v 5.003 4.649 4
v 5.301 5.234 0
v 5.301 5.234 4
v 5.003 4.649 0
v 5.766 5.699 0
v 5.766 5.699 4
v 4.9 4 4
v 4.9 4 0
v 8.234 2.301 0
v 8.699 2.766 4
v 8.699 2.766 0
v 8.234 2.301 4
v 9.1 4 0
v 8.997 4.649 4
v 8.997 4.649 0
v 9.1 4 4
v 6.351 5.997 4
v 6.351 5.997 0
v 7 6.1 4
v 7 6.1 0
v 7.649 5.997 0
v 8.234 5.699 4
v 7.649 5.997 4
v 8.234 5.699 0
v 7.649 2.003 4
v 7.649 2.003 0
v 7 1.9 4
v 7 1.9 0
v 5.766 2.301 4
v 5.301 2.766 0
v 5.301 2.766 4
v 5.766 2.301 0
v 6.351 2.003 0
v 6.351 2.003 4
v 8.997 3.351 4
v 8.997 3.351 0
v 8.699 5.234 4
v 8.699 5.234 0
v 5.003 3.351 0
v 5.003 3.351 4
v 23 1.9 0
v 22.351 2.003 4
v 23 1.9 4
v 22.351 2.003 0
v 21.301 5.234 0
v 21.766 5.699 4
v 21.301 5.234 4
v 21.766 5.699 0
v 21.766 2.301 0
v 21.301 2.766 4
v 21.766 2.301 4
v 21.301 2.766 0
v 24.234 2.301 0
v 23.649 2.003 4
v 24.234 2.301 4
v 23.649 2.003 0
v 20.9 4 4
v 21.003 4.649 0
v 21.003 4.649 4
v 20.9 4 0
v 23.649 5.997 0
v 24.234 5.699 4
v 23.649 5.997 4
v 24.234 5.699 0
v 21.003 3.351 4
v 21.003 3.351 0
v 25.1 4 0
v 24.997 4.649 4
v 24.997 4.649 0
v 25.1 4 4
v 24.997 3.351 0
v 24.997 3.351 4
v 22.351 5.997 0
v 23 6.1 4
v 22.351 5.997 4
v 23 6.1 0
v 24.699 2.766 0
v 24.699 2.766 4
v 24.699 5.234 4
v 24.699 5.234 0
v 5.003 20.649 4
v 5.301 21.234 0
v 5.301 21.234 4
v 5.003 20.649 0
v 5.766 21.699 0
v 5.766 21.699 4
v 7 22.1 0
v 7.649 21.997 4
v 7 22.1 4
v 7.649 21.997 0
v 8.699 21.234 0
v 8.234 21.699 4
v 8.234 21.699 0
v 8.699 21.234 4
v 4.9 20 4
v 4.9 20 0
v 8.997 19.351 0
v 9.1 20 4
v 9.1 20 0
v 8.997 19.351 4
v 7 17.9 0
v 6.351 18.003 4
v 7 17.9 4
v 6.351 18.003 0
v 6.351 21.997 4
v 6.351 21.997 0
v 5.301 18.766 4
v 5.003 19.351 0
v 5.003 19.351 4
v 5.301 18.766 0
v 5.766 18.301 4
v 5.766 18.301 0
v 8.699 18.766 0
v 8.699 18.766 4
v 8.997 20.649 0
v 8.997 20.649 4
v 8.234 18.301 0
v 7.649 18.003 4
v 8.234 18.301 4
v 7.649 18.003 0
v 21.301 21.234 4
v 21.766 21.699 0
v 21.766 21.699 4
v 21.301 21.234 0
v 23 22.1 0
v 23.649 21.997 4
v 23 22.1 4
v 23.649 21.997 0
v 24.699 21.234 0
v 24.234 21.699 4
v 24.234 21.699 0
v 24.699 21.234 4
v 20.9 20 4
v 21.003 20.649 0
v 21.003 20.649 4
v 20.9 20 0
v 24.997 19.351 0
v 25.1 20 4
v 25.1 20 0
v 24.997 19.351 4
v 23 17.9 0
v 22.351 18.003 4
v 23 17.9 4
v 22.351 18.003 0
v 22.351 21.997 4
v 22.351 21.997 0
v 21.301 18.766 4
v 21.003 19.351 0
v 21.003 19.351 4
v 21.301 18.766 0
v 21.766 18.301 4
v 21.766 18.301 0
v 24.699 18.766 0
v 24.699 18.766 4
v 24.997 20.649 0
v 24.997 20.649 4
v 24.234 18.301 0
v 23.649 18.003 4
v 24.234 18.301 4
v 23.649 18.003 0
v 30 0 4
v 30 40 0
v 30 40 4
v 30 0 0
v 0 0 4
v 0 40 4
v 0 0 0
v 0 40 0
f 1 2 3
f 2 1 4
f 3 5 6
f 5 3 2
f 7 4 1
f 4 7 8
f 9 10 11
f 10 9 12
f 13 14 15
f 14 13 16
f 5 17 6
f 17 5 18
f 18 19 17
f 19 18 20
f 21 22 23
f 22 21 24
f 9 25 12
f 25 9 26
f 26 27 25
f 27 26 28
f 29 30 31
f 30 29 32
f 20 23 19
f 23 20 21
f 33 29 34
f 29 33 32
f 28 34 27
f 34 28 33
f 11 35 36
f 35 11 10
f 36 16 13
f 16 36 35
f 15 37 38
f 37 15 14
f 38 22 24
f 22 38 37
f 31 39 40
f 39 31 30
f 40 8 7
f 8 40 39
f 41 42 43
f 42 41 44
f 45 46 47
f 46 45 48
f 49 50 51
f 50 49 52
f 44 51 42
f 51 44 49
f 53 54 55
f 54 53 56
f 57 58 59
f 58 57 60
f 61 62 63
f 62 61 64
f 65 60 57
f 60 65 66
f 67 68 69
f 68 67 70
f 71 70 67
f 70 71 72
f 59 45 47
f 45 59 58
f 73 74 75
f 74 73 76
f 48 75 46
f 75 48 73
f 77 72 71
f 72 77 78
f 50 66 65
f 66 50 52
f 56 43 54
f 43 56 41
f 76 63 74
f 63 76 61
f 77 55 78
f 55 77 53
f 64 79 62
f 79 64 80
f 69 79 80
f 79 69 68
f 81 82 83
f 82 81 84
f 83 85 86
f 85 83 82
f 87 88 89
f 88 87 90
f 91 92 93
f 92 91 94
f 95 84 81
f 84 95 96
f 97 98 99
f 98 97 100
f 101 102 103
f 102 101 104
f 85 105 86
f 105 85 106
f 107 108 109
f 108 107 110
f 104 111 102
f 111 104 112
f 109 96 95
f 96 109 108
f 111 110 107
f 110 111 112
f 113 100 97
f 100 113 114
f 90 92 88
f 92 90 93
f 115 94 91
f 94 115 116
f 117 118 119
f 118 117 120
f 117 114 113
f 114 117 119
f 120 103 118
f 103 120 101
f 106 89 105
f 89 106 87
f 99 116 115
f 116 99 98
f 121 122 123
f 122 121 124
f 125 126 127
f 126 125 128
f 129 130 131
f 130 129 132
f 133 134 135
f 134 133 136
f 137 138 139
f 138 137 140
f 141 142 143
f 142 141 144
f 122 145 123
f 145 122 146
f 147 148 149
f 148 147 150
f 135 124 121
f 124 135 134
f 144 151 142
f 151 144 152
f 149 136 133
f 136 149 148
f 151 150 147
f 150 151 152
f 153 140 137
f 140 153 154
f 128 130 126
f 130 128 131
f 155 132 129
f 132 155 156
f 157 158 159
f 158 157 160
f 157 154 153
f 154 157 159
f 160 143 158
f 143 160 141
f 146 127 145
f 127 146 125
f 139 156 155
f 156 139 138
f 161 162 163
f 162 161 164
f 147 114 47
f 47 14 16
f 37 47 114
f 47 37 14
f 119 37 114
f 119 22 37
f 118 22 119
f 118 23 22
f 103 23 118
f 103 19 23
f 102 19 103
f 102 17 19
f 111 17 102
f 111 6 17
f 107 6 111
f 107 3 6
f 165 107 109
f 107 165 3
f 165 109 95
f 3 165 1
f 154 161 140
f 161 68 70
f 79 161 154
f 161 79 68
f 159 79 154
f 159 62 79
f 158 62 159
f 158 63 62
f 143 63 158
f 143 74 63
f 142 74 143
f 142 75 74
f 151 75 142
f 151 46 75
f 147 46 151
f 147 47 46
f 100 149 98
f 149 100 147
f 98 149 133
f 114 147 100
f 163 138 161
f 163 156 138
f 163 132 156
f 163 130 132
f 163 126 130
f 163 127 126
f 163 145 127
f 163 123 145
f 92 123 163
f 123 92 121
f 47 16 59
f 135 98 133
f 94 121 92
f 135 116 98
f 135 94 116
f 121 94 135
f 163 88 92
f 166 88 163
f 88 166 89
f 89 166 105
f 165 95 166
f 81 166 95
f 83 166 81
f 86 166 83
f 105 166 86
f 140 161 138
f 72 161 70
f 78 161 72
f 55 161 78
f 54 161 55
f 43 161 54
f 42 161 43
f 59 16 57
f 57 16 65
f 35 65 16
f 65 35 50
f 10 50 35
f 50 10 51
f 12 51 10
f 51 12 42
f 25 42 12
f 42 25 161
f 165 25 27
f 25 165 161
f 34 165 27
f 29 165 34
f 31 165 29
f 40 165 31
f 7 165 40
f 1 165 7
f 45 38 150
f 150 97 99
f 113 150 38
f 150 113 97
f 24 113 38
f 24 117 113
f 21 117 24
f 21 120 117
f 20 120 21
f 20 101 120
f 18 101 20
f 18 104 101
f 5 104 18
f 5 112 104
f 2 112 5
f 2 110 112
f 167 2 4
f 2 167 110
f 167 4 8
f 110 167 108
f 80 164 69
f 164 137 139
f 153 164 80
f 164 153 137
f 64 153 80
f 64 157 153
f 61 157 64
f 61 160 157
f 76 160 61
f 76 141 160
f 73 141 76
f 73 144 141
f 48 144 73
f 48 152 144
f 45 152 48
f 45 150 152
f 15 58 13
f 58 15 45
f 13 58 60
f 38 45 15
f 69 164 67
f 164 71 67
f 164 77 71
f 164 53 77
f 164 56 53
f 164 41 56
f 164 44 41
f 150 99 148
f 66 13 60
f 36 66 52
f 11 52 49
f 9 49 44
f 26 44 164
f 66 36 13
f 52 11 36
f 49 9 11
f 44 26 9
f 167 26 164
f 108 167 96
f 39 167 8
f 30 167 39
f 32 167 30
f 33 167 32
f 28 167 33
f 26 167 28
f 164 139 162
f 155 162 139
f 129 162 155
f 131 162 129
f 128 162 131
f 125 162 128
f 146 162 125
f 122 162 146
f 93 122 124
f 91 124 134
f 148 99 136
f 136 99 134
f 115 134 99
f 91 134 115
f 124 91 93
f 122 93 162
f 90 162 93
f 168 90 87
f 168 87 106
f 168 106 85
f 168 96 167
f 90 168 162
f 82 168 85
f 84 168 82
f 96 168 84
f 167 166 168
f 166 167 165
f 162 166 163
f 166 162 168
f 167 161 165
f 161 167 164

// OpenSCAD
include <wallace2.scad>;

gNema17MountDiagonal = 43;
mountHoleRadius = 3/2*1.1;
mountRadius = gNema17MountDiagonal/2;
shaftcollarradius = 11.5;

x_carriage2();

plate_w = 30;
plate_h = 40;
plate_d = 4;

deltay = 4;
//extruder_mount_hole_spacing = 50;
//extruder_shift = extruder_mount_hole_spacing/2; // + bearing_size/2;

module x_carriage2() {

	difference(){
	
		// base plate
		translate([0,0,0]) rotate([0,0,0]){		
			translate([0,0*-plate_w/2,0]) cube([plate_w, plate_h,plate_d]);
		}

    	translate([(plate_w-16)/2,deltay,0]) rotate([0,90,0]){
			// screw holes for extruder mount
			for(ty = [0, 16]) for(tx = [0, -16]) rotate([0,90,0])
			translate([tx,ty,-plate_d-1]) 
			#cylinder(r=2.1,h=plate_d+2);
			//translate([0,26,0])for(tx = [8, -8]) rotate([0,90,0]) translate([-plate_w/2+side,extruder_shift-extruder_mount_hole_spacing/2,-bearing_size/2-4]) #cylinder(r=2.1,h=bearing_size+8+1);
			
		}

		/*
			// Create the mounting holes
			rotate([90,0,0])
			for(hole=[0:3])
			{
				rotate([0,0,(hole*90)+45])
				translate([mountRadius, 0, 0])
				#cylinder(r=mountHoleRadius, h=3, center=false, $fn=12);
			}
*/

		
	}
}
